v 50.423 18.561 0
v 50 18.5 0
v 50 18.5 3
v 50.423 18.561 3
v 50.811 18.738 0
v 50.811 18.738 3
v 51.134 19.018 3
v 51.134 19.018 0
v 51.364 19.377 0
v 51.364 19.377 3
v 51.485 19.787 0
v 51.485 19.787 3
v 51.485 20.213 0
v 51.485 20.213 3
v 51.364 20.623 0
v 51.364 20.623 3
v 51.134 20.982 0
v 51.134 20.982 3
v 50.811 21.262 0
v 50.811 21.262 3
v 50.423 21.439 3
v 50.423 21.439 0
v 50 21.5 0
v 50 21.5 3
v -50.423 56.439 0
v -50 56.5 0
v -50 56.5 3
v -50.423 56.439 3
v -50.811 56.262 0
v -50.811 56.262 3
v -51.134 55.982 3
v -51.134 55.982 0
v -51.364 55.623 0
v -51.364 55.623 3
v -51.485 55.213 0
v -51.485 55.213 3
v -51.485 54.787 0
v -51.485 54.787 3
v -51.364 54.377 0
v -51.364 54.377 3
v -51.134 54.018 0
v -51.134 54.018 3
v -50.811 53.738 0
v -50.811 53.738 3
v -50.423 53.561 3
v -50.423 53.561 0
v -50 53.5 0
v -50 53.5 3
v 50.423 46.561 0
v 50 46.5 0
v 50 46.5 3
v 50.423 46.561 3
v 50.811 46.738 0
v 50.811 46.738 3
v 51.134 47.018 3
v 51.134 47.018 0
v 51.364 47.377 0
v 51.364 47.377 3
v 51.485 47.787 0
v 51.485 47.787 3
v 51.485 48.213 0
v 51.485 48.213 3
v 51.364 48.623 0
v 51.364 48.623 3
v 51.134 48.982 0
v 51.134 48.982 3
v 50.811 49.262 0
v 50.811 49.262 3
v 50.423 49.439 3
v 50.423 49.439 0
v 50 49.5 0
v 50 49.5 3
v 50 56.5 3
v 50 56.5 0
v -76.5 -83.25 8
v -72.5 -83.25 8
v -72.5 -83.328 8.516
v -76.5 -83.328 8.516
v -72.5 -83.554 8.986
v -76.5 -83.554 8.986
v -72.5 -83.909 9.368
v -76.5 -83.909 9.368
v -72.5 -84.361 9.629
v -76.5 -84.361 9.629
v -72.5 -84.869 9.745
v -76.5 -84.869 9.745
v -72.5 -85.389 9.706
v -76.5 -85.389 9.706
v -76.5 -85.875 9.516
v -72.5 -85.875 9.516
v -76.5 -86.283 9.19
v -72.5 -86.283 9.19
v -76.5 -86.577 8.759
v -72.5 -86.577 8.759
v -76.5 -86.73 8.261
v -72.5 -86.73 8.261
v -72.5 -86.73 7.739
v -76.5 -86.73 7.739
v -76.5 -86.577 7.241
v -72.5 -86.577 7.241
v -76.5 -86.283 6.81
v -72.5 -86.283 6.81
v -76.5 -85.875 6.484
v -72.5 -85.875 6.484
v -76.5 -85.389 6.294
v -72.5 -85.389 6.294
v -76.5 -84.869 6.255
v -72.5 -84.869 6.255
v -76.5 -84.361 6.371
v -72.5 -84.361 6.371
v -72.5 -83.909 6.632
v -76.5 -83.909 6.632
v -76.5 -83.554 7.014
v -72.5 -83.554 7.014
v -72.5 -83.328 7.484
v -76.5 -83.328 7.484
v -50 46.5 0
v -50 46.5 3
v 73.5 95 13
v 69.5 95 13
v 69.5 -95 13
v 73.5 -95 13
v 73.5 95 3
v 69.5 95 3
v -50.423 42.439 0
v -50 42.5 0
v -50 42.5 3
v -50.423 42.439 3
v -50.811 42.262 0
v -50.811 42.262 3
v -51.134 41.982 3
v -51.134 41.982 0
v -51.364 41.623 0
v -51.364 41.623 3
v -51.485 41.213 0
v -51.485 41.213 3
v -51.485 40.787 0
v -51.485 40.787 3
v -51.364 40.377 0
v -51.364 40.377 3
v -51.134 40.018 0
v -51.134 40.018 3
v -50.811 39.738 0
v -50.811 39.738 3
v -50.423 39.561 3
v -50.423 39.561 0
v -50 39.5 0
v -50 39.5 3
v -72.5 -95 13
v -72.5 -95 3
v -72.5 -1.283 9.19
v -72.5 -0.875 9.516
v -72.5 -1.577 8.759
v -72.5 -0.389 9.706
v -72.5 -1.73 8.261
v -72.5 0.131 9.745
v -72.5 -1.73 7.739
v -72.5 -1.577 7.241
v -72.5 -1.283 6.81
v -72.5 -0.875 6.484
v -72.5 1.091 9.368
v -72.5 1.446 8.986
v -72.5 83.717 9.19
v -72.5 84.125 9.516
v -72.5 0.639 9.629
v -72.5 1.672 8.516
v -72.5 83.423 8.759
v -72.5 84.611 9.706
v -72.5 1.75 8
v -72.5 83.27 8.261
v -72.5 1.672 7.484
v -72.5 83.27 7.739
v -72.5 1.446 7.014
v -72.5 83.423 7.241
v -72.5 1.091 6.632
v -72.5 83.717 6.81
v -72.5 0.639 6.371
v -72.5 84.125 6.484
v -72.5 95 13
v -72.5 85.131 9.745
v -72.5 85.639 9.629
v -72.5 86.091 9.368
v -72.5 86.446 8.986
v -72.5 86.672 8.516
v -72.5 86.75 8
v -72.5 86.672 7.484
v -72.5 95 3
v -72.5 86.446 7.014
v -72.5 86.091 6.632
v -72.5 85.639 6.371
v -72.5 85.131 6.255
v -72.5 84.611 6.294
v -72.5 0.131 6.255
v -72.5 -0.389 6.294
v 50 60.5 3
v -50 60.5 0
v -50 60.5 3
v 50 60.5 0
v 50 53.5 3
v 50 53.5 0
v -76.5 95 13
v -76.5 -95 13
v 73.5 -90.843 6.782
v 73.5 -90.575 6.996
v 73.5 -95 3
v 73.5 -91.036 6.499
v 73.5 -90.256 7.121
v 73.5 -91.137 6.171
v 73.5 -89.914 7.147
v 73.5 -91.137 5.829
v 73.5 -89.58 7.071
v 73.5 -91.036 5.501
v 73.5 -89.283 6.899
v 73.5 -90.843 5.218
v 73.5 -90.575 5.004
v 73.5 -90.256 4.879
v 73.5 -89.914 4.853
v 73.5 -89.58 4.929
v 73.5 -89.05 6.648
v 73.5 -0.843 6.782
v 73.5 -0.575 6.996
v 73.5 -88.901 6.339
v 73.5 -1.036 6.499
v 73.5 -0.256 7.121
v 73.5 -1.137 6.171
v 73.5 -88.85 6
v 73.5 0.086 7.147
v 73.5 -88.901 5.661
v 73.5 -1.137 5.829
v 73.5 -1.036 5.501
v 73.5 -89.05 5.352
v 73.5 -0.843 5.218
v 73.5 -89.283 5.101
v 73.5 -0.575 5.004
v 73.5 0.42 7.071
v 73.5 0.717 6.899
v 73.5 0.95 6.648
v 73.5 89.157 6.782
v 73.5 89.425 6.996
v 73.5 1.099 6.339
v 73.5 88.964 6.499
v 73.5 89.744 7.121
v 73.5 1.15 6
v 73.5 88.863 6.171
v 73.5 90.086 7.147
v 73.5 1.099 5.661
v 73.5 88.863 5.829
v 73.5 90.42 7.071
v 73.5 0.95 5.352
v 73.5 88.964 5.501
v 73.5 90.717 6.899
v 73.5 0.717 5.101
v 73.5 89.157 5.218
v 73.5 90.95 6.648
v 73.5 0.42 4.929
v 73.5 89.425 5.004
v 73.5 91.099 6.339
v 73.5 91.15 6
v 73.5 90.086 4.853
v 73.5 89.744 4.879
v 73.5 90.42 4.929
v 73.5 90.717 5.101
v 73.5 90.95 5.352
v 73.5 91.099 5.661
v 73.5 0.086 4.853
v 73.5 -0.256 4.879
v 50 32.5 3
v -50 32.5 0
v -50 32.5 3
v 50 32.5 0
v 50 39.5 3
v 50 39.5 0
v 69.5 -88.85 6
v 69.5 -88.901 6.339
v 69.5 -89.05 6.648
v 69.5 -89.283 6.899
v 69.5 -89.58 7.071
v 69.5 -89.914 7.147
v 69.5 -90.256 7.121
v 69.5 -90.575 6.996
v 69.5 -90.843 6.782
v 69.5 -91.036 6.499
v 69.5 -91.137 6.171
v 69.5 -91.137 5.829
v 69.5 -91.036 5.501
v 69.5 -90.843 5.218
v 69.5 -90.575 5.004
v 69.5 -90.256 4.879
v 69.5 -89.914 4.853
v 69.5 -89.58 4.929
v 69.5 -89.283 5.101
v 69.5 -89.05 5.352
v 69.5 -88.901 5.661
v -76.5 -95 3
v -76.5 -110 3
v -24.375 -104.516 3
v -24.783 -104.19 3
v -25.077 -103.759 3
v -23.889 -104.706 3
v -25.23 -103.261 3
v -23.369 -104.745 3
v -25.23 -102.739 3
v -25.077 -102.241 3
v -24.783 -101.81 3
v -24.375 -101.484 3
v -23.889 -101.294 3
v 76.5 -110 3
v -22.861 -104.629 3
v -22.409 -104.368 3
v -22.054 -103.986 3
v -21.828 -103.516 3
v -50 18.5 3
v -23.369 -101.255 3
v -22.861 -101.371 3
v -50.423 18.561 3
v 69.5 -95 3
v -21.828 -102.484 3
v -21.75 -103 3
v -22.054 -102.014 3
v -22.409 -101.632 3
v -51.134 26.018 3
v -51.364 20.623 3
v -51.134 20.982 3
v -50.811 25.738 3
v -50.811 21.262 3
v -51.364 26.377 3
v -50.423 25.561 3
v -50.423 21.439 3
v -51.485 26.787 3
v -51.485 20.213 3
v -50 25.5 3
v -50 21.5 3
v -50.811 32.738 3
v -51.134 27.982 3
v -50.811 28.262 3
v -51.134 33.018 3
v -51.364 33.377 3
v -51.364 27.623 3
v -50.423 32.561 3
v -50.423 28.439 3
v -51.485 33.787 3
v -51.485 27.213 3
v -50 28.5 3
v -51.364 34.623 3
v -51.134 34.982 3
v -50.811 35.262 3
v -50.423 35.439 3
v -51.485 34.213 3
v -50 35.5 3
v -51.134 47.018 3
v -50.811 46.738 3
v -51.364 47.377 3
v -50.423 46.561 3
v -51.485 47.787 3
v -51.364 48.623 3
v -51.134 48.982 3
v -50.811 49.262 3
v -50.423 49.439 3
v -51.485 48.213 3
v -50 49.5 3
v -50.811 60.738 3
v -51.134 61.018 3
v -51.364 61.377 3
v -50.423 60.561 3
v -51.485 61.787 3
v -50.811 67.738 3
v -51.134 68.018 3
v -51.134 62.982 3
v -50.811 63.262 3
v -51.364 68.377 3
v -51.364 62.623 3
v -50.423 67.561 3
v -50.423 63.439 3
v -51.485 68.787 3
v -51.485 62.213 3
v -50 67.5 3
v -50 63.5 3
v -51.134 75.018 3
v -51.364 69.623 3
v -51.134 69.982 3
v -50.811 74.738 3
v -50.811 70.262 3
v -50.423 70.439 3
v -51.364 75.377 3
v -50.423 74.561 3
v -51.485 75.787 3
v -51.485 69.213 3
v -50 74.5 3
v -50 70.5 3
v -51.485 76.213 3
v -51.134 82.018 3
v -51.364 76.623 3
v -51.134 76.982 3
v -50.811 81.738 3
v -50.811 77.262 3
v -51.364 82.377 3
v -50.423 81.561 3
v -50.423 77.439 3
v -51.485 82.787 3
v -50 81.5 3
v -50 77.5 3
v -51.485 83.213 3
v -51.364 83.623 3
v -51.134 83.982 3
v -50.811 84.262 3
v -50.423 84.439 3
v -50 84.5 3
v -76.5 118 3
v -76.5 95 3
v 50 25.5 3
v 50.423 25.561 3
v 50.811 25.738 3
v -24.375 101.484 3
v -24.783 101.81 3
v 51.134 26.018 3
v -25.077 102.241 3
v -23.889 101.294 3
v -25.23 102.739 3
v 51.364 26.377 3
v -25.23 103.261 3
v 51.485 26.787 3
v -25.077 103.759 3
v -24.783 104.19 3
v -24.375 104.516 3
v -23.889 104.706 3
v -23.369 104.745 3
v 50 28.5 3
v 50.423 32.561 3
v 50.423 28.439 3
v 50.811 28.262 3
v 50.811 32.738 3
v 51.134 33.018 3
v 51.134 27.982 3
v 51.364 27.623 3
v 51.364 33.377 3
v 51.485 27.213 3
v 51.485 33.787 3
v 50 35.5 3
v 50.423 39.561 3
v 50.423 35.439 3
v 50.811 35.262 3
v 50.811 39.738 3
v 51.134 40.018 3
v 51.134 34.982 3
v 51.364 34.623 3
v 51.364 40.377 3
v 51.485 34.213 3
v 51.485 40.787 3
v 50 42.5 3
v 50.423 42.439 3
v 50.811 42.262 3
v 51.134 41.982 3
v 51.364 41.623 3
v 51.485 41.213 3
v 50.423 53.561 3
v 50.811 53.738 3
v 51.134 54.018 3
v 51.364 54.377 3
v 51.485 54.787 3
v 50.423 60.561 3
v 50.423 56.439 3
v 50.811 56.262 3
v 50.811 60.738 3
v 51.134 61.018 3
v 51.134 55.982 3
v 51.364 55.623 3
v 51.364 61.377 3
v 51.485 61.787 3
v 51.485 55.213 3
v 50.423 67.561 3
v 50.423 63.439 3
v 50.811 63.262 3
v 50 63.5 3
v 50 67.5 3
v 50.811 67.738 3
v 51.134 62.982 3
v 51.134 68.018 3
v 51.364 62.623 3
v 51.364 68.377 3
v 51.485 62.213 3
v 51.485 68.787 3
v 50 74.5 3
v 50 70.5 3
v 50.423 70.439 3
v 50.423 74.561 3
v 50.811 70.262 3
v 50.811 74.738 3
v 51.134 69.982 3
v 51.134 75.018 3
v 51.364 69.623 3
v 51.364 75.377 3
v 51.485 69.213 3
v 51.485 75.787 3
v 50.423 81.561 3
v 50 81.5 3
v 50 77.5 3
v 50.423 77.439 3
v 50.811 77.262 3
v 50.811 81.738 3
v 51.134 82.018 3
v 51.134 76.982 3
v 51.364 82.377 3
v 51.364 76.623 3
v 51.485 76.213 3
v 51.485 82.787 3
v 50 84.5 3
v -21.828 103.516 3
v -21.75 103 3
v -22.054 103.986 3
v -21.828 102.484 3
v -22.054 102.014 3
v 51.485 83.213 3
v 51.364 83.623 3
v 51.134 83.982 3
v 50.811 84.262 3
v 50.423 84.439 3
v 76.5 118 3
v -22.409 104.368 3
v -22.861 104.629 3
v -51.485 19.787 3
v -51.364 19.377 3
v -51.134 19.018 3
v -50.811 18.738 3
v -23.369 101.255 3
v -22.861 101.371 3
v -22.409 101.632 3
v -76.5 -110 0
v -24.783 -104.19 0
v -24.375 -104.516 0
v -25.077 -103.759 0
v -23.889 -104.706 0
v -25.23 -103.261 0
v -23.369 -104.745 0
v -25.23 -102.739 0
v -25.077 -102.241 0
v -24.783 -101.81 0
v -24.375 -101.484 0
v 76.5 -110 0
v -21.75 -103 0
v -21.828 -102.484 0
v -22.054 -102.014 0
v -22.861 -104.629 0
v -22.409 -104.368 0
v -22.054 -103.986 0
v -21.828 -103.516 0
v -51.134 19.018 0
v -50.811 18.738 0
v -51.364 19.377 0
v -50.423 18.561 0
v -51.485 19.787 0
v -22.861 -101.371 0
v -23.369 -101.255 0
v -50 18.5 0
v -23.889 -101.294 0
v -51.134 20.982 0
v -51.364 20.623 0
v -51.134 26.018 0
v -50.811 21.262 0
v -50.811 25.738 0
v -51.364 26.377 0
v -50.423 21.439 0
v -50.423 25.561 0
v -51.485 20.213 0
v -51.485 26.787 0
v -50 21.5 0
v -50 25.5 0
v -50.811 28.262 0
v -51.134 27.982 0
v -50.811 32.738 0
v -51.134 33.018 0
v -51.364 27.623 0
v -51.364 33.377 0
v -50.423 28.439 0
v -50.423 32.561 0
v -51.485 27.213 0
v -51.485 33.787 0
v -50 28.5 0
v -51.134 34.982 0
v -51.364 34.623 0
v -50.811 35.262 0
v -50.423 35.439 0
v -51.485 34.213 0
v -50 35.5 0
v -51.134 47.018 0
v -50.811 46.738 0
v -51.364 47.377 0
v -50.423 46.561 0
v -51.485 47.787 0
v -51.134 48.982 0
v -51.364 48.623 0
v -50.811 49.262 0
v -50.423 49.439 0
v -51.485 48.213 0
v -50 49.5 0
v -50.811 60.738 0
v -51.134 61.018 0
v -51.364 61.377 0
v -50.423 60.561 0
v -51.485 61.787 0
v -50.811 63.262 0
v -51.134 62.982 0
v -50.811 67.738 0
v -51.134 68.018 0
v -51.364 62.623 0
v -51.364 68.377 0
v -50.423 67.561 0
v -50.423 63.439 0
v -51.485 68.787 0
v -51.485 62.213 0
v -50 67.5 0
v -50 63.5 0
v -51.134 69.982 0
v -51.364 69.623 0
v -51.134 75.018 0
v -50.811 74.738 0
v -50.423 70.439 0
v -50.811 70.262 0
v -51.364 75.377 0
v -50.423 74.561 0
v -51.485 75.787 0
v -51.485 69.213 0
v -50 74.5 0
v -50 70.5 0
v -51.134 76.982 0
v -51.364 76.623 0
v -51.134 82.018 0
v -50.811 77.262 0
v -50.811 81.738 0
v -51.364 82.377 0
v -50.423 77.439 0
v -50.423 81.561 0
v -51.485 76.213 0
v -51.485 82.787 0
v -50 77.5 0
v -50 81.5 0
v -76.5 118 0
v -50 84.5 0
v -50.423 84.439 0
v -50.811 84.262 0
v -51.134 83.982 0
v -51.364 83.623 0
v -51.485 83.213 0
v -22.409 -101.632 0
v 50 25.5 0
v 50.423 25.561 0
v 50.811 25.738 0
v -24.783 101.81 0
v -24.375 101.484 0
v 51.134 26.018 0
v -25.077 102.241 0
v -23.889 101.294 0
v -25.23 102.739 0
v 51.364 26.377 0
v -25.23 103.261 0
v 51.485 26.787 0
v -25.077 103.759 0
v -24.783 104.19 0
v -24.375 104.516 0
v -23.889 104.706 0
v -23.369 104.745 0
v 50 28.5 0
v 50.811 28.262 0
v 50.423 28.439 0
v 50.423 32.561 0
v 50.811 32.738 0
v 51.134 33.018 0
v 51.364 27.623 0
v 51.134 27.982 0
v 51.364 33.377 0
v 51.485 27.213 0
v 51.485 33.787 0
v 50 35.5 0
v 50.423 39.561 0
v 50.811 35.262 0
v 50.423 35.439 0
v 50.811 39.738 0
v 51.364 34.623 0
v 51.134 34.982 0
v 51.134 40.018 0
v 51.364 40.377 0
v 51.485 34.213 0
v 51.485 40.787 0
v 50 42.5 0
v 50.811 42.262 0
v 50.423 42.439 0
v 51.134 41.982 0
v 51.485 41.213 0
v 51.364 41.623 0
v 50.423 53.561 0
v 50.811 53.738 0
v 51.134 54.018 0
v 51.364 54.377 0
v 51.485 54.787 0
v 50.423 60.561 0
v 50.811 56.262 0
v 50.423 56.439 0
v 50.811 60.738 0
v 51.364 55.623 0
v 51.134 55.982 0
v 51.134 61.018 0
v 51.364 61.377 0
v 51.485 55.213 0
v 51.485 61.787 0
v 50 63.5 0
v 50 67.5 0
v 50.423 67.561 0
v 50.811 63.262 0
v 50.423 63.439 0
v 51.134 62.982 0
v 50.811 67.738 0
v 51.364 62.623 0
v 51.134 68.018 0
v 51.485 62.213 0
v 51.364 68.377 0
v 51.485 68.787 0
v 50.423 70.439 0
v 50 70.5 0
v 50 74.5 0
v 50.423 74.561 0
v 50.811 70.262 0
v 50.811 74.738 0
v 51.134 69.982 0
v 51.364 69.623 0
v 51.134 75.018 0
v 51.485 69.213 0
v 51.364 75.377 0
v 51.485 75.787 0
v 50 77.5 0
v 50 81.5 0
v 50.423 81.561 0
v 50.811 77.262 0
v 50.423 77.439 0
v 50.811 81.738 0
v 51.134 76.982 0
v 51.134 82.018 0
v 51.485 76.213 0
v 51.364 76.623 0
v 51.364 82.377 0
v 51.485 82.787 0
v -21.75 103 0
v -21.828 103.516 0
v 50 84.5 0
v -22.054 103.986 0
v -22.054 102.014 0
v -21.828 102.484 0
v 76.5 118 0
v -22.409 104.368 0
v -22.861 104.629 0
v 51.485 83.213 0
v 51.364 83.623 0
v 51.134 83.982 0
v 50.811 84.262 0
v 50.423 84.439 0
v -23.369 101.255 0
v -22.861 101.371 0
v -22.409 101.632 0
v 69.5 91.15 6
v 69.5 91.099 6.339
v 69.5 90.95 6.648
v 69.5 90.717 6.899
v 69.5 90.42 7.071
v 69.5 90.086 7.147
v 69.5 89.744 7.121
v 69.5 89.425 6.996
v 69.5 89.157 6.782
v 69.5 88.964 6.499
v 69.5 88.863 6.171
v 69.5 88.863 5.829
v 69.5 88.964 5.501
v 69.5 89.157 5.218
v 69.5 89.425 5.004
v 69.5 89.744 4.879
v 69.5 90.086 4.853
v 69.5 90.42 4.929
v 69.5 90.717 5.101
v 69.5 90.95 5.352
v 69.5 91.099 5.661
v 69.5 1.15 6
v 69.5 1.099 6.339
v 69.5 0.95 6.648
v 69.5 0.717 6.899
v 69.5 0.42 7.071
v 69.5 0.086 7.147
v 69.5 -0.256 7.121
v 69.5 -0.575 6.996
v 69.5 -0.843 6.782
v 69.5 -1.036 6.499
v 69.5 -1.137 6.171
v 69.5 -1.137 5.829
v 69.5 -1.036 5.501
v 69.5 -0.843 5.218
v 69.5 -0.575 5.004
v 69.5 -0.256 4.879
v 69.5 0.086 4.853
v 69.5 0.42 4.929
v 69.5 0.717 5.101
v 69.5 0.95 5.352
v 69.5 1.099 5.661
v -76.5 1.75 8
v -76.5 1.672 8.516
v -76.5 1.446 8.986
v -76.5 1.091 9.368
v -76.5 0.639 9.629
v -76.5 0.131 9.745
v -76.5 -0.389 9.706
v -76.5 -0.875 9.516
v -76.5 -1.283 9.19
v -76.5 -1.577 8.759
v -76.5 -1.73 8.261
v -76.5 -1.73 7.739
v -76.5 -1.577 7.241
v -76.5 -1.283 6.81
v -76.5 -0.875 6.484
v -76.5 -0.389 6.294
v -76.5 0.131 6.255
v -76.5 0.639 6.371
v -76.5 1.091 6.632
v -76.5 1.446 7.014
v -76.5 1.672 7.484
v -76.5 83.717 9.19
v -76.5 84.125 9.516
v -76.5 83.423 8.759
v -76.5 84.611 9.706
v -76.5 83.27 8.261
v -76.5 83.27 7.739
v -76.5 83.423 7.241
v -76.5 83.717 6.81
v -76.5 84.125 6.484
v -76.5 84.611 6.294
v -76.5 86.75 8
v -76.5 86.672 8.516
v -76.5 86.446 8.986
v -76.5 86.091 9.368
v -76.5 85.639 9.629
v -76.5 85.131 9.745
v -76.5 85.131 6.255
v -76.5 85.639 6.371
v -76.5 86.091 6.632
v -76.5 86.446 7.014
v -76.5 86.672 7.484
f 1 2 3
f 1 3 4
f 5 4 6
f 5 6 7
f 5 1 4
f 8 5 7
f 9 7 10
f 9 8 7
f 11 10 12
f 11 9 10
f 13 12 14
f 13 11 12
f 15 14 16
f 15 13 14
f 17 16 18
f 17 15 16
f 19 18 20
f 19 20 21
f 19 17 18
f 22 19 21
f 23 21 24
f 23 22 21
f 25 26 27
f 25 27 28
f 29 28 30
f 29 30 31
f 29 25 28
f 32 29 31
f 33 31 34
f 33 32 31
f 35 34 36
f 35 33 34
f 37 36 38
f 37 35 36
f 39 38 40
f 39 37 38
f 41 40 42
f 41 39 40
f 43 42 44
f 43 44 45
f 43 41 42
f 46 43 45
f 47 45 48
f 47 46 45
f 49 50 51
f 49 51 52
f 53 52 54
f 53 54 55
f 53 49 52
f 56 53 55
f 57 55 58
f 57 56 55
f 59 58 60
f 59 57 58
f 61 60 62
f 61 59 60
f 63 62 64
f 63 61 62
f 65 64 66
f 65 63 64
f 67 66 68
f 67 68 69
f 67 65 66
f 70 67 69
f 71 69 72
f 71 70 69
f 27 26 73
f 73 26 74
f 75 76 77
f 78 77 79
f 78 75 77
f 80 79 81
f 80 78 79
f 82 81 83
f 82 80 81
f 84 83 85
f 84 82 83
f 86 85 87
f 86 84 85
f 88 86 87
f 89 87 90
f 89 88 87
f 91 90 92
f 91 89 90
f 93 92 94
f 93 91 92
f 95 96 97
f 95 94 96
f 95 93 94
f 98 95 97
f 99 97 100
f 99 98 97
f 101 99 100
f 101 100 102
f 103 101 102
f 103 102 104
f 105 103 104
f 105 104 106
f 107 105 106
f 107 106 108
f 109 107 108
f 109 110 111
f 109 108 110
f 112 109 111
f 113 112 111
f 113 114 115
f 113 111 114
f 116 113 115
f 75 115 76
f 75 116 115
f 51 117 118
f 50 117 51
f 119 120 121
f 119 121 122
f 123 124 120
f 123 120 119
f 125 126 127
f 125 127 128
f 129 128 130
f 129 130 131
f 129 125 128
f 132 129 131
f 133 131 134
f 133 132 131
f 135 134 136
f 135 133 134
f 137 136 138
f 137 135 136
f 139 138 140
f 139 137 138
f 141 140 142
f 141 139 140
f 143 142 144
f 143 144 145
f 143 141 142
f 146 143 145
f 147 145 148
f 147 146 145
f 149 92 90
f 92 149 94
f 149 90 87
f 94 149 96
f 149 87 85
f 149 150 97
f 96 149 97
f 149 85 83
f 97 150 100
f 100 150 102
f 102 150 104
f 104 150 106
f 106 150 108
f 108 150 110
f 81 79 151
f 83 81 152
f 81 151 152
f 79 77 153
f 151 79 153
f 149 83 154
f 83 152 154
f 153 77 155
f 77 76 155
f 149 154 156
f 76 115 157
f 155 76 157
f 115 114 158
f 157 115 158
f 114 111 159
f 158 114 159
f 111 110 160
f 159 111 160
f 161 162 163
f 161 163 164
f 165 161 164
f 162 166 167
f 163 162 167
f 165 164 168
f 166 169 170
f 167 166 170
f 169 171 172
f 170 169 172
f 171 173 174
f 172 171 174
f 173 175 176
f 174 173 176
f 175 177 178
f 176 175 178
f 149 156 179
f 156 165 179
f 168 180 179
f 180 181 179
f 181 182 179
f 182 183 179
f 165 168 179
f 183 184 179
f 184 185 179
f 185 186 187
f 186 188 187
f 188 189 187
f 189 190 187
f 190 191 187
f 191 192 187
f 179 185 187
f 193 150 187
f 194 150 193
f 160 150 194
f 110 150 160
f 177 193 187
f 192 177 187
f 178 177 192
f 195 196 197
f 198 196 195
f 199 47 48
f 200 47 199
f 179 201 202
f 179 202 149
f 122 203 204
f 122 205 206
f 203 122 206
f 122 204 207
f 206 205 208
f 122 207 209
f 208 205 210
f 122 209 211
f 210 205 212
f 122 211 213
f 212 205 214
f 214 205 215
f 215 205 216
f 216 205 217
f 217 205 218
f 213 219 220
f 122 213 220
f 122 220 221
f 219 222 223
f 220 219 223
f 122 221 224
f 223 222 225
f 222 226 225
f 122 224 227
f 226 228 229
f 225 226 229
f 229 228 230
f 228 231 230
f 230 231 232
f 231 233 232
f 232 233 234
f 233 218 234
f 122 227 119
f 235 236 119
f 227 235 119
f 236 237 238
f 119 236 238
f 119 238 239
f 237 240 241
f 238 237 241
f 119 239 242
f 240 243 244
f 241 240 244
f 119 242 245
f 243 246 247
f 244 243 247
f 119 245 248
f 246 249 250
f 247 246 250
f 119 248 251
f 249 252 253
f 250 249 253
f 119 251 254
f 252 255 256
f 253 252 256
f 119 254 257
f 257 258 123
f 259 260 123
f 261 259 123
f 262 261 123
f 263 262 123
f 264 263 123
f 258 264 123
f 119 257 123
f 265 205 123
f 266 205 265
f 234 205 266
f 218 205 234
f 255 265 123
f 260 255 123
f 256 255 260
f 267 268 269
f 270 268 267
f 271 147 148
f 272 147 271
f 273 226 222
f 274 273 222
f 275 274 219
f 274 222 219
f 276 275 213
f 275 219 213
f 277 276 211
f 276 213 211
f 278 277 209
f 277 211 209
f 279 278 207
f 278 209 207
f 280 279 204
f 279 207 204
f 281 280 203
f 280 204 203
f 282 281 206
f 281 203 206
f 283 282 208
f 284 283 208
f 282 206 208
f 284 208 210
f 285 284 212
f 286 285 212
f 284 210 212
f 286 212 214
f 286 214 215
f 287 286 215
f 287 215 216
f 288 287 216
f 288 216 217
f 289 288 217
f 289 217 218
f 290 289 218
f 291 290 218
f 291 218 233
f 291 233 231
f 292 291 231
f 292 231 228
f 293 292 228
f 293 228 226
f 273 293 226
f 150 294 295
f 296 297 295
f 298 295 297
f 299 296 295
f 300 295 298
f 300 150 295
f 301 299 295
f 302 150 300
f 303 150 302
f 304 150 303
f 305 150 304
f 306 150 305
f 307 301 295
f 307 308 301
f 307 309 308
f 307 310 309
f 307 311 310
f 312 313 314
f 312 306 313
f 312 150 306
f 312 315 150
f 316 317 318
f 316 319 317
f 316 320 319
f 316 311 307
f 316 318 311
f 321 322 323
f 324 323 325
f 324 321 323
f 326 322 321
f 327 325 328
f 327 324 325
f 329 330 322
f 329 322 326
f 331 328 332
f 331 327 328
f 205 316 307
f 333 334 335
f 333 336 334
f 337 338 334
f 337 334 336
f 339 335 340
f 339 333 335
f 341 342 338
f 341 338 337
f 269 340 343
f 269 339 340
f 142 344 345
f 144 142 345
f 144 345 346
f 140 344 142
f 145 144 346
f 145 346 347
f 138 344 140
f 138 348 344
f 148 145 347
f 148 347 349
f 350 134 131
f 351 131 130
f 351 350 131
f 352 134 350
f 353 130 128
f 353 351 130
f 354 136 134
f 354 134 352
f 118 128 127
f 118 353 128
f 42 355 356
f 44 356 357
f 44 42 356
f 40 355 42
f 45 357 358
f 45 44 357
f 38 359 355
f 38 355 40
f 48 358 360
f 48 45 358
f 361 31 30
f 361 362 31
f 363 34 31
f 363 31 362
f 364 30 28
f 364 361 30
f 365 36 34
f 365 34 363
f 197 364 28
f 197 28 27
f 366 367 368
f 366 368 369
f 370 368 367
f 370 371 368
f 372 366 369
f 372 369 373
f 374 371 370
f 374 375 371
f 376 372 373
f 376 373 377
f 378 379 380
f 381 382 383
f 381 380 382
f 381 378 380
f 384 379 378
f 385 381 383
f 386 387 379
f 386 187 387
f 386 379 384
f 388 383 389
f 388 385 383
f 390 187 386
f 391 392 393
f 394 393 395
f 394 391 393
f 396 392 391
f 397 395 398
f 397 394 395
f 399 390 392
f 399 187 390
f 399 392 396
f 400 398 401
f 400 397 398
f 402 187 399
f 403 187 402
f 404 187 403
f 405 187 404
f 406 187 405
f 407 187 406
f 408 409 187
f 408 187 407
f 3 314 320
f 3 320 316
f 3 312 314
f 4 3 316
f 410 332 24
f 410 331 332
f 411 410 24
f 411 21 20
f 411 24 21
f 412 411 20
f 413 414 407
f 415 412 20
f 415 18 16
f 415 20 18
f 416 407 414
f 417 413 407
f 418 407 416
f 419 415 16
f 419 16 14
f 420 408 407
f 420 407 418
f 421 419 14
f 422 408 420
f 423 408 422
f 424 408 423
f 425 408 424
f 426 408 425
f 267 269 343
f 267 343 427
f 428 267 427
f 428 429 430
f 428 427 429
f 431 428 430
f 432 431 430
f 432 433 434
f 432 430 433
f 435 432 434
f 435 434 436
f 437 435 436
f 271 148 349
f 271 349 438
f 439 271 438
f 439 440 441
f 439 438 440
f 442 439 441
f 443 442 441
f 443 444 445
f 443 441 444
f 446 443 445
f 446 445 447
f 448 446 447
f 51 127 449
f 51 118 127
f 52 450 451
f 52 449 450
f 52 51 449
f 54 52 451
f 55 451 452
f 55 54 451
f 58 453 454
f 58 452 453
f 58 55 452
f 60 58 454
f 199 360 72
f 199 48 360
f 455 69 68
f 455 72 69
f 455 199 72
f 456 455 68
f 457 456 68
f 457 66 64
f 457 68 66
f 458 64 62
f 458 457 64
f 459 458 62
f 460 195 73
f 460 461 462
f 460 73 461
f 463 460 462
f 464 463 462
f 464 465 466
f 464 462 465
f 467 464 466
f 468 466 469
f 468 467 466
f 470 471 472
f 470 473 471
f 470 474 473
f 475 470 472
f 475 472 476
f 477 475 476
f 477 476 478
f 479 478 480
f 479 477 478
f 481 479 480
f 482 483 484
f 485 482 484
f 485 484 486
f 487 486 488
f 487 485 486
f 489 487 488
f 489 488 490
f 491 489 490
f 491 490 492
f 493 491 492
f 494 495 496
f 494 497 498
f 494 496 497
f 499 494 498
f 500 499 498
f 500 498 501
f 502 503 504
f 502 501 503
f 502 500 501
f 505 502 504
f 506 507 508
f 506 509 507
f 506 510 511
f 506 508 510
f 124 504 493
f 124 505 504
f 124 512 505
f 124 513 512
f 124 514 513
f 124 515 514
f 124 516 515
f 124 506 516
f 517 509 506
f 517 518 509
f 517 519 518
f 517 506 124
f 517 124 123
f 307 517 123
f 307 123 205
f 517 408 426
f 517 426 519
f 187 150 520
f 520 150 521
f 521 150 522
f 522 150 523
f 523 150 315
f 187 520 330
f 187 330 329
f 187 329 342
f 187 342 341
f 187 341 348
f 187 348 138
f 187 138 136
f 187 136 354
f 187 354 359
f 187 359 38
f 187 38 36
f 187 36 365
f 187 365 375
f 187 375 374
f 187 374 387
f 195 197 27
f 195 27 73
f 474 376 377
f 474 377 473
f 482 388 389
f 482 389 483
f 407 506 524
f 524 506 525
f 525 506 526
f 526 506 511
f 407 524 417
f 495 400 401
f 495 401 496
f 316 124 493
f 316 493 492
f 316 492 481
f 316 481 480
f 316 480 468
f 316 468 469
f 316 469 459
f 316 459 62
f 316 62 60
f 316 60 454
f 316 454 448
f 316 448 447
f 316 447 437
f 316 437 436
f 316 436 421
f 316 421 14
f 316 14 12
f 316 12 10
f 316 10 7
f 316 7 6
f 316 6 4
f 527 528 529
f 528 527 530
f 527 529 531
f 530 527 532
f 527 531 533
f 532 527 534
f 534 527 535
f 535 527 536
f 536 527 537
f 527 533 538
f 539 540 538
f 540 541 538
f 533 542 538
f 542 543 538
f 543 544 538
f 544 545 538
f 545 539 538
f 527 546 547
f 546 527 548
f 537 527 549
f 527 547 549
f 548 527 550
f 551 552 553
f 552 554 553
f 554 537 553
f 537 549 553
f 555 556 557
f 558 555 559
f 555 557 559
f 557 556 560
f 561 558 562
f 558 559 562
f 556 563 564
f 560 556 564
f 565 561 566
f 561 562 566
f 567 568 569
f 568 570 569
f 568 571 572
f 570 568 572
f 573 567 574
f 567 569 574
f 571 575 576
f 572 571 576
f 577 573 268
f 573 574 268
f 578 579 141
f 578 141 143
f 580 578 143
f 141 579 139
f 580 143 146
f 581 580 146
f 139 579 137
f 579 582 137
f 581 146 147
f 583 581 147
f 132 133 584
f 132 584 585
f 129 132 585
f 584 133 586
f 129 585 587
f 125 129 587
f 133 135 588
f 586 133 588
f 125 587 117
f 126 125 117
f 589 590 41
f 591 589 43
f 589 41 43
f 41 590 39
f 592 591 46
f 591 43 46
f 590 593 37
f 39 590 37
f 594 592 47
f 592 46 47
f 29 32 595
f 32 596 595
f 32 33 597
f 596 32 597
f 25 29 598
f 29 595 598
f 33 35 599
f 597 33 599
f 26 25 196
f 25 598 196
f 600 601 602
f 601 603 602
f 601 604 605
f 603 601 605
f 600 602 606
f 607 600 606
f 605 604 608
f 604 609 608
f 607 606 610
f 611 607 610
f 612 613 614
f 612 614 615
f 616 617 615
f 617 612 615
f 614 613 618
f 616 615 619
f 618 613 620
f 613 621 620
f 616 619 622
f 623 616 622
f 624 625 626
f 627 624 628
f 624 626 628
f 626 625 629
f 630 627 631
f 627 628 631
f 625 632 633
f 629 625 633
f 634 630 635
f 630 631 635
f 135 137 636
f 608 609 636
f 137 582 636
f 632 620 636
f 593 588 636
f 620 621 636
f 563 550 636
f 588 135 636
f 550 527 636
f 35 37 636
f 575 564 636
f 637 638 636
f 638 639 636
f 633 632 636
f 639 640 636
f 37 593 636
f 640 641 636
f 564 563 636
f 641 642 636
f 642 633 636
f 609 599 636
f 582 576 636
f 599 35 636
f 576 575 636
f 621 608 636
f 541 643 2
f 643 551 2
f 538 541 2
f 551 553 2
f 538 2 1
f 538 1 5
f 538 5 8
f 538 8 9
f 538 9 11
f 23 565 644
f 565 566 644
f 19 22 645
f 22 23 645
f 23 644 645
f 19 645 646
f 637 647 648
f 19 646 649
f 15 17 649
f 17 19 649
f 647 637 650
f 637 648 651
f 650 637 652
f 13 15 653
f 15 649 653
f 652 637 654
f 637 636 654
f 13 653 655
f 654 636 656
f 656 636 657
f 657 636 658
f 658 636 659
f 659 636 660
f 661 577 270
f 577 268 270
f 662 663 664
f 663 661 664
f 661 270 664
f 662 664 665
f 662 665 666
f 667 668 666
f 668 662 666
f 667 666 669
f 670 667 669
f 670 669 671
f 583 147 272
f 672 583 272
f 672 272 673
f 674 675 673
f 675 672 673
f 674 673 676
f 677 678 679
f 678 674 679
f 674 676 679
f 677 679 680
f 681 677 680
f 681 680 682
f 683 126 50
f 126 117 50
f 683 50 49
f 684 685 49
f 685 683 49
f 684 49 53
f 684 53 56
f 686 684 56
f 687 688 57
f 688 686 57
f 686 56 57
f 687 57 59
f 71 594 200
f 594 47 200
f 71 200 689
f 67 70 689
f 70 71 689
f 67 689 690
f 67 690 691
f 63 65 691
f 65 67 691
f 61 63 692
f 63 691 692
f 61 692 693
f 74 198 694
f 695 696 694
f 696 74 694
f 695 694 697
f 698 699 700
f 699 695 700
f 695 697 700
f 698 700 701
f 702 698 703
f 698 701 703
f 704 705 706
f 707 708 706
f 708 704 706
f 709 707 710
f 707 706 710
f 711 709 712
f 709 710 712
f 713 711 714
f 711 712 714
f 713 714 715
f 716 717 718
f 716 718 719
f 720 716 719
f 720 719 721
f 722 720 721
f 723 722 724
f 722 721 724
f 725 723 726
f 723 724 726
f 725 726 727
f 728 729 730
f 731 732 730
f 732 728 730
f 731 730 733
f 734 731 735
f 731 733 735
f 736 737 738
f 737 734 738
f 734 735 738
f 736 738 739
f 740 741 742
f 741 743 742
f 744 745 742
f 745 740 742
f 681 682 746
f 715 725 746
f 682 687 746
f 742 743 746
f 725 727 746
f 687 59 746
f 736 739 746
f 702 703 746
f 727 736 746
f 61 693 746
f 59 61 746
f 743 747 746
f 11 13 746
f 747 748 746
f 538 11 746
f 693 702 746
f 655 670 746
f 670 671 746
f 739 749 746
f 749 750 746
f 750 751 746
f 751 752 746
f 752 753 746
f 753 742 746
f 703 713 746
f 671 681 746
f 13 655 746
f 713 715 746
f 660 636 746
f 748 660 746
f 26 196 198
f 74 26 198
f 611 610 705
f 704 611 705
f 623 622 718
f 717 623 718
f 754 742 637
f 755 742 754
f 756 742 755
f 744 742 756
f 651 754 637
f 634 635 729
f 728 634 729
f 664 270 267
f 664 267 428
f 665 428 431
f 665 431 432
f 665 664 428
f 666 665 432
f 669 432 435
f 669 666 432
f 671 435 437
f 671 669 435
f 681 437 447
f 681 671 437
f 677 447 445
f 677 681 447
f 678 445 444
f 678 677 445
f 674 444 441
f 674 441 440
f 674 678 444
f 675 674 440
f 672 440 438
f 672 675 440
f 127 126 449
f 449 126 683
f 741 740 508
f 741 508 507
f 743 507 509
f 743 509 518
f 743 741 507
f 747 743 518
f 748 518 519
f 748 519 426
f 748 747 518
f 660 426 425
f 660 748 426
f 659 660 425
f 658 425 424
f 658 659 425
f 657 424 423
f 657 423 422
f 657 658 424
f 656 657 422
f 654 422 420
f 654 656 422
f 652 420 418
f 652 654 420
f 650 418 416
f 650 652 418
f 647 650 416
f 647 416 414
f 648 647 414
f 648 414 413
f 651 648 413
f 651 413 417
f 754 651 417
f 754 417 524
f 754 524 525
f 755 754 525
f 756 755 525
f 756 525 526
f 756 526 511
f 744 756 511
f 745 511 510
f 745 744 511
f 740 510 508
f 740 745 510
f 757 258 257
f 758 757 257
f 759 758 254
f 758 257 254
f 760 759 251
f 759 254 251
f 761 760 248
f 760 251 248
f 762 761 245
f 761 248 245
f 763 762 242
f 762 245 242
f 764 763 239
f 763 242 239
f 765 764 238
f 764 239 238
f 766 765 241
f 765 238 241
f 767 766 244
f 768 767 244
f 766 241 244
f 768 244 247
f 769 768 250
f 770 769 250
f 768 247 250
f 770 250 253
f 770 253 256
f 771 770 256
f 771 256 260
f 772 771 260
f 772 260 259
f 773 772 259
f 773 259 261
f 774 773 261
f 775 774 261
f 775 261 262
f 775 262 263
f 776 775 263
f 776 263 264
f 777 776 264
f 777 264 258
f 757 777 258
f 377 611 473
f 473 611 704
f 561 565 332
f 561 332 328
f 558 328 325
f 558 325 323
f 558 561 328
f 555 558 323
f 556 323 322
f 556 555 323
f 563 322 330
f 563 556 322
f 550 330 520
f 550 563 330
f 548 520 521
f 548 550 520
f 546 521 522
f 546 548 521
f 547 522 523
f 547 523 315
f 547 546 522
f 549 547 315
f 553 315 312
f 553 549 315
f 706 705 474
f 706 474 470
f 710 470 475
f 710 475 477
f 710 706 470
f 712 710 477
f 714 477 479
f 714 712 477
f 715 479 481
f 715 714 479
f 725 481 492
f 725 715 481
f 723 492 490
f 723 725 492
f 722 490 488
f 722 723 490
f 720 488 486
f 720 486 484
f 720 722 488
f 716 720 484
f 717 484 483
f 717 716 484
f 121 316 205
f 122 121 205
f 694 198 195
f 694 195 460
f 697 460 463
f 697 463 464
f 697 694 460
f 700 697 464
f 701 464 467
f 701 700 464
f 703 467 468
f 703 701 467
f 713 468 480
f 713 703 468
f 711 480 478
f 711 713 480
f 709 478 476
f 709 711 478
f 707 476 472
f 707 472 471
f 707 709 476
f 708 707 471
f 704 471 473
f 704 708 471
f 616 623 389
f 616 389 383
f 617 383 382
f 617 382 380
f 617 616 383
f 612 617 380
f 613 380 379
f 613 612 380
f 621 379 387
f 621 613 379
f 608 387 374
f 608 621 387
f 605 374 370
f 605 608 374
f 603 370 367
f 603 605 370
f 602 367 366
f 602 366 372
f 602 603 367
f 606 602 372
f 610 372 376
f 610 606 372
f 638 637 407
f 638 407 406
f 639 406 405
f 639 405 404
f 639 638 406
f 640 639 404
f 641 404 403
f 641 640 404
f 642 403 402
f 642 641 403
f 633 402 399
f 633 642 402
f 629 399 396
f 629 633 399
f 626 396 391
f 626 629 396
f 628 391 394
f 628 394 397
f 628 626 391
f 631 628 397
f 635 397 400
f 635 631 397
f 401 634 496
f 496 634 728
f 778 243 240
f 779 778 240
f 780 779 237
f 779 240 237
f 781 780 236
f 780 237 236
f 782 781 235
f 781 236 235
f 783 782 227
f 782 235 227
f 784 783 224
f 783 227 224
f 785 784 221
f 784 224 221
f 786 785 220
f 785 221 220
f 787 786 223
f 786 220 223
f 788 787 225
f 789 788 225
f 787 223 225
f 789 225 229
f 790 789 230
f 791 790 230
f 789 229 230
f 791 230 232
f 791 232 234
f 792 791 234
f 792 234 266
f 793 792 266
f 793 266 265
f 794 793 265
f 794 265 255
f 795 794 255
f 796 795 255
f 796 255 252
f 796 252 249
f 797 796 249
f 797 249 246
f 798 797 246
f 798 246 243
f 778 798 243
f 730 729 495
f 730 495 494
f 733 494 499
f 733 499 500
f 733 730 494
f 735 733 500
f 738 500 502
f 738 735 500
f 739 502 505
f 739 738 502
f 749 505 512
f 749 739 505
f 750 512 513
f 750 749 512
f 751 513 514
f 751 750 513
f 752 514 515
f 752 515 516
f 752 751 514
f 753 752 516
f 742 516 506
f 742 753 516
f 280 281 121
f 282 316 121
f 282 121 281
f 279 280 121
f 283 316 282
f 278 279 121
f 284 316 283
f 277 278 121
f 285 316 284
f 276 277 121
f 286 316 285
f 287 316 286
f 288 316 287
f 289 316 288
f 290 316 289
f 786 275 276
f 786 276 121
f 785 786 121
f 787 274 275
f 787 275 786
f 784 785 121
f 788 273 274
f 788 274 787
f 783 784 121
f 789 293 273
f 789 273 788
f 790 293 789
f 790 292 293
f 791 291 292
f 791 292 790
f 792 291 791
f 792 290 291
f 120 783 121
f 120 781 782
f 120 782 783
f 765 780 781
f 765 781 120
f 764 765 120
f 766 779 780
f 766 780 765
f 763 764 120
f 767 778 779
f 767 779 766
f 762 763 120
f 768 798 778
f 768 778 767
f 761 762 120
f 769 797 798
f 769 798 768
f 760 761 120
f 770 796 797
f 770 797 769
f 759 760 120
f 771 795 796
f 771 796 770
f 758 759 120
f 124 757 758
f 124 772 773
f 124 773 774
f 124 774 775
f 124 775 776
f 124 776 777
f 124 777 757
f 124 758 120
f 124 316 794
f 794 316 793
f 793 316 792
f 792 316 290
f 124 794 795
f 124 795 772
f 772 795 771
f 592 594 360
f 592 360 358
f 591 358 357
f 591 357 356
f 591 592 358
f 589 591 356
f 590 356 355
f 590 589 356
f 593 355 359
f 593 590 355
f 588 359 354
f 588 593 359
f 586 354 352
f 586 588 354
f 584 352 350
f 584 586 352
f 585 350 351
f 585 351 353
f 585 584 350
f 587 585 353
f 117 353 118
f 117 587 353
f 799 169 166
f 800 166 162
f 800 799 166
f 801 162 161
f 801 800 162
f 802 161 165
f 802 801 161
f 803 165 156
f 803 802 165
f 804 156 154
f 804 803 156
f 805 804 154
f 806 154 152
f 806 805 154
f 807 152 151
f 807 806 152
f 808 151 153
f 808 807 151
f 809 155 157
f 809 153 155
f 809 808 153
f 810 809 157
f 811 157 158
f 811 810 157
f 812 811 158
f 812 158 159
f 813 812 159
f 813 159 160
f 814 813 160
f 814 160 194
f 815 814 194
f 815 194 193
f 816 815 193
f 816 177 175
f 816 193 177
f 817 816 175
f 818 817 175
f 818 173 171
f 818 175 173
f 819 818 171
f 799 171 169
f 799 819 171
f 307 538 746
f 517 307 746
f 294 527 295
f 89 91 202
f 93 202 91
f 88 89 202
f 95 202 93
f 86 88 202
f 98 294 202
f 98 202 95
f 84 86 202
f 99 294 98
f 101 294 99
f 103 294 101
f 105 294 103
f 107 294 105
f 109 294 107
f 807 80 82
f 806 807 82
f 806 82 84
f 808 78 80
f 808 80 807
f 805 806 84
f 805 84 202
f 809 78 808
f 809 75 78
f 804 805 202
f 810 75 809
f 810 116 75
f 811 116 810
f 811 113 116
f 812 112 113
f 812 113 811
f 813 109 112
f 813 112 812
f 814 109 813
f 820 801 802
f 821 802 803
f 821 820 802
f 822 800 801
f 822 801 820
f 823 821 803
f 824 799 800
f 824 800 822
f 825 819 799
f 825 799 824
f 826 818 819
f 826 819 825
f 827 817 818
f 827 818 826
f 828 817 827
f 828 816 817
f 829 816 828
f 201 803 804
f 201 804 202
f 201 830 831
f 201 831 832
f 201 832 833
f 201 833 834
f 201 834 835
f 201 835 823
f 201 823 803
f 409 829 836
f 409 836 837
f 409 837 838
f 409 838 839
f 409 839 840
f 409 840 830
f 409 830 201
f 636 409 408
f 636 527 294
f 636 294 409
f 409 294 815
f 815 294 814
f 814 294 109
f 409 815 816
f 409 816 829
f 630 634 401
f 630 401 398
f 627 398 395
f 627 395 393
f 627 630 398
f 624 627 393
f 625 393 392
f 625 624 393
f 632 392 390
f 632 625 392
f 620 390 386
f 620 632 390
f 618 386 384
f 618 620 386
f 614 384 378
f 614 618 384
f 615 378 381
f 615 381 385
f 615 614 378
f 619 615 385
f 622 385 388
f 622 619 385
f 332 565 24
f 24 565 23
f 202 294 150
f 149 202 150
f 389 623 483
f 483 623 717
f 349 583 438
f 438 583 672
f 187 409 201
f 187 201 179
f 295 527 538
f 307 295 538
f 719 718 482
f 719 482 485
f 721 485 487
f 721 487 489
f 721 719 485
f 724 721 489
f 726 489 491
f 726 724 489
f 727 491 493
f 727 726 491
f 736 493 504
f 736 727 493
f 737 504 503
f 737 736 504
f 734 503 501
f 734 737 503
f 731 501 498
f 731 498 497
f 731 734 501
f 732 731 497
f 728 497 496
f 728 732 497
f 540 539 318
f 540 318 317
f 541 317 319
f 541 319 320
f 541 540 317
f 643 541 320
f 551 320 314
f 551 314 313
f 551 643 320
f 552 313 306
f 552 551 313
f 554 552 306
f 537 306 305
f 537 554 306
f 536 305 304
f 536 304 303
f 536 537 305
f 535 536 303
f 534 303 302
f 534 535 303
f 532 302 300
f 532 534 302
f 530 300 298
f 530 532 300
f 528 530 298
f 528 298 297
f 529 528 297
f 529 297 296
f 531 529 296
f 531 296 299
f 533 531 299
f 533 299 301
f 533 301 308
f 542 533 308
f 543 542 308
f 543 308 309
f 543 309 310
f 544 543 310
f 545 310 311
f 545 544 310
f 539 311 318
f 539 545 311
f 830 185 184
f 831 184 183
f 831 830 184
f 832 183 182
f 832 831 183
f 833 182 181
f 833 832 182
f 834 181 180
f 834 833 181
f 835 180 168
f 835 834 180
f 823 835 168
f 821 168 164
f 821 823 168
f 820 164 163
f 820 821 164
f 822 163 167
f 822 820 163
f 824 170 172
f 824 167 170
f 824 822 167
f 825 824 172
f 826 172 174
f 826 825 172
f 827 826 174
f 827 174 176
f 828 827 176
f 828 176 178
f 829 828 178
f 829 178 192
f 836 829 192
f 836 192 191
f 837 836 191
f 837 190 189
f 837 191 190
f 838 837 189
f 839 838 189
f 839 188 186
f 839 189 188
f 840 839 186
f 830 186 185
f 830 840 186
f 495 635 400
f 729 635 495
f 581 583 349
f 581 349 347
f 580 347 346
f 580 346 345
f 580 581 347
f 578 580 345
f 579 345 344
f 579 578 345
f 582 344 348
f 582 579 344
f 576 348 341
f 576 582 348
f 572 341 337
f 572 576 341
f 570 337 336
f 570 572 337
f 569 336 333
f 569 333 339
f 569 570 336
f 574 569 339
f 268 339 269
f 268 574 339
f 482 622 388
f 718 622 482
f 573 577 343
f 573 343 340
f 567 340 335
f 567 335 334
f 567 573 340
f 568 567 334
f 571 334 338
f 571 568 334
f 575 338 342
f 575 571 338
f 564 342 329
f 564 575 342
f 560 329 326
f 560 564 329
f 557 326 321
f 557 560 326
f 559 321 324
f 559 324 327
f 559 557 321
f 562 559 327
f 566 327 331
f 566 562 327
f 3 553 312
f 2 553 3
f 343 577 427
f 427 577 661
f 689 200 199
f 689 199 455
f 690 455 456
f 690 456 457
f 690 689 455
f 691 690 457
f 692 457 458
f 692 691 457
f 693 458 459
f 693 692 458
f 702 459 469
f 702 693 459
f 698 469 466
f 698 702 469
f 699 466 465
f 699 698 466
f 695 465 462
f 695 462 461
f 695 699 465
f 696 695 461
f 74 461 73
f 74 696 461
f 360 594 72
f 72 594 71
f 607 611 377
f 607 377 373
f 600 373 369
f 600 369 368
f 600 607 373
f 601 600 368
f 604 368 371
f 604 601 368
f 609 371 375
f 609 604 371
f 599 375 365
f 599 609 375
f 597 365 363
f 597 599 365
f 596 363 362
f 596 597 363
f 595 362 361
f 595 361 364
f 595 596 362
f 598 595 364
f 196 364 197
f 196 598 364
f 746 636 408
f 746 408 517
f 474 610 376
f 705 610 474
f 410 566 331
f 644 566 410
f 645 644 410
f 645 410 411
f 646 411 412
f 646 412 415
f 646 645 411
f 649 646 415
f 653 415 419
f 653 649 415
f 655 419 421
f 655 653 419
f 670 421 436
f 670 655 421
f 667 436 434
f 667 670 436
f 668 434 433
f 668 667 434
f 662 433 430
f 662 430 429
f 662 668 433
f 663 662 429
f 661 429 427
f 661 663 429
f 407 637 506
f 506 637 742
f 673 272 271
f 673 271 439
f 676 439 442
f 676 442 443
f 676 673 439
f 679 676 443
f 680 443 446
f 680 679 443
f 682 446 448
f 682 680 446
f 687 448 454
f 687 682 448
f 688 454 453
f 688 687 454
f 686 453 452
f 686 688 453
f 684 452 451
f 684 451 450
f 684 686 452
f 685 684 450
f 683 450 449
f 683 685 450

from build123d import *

# Parameters (mm, degrees)
SKETCH_W        = 153
SKETCH_H        = 228
SKETCH_R        = 1.75
PAD_DEPTH       = 3
SKETCH001_W     = 4
SKETCH001_H     = 190
PAD001_DEPTH    = 10
SKETCH002_R     = 1.75
POCKET_DEPTH    = 5
SKETCH003_R     = 1.15
POCKET001_DEPTH = 5


with BuildPart() as part:
    # Sketch → Pad (new body)
    with BuildSketch(Plane.XY):
        with Locations((0, 4)):
            Rectangle(SKETCH_W, SKETCH_H)
        with Locations((-23.5, 103)):
            Circle(SKETCH_R, mode=Mode.SUBTRACT)
        with Locations((-23.5, -103)):
            Circle(SKETCH_R, mode=Mode.SUBTRACT)
        with BuildLine():
            ThreePointArc((-50, 84.5), (-51.5, 83), (-50, 81.5))
            Line((-50, 81.5), (50, 81.5))
            ThreePointArc((50, 81.5), (51.5, 83), (50, 84.5))
            Line((-50, 84.5), (50, 84.5))
        make_face(mode=Mode.SUBTRACT)
        with BuildLine():
            ThreePointArc((-50, 77.5), (-51.5, 76), (-50, 74.5))
            Line((-50, 74.5), (50, 74.5))
            ThreePointArc((50, 74.5), (51.5, 76), (50, 77.5))
            Line((-50, 77.5), (50, 77.5))
        make_face(mode=Mode.SUBTRACT)
        with BuildLine():
            ThreePointArc((-50, 70.5), (-51.5, 69), (-50, 67.5))
            Line((-50, 67.5), (50, 67.5))
            ThreePointArc((50, 67.5), (51.5, 69), (50, 70.5))
            Line((-50, 70.5), (50, 70.5))
        make_face(mode=Mode.SUBTRACT)
        with BuildLine():
            ThreePointArc((-50, 63.5), (-51.5, 62), (-50, 60.5))
            Line((-50, 60.5), (50, 60.5))
            ThreePointArc((50, 60.5), (51.5, 62), (50, 63.5))
            Line((-50, 63.5), (50, 63.5))
        make_face(mode=Mode.SUBTRACT)
        with BuildLine():
            ThreePointArc((-50, 56.5), (-51.5, 55), (-50, 53.5))
            Line((-50, 53.5), (50, 53.5))
            ThreePointArc((50, 53.5), (51.5, 55), (50, 56.5))
            Line((-50, 56.5), (50, 56.5))
        make_face(mode=Mode.SUBTRACT)
        with BuildLine():
            ThreePointArc((-50, 49.5), (-51.5, 48), (-50, 46.5))
            Line((-50, 46.5), (50, 46.5))
            ThreePointArc((50, 46.5), (51.5, 48), (50, 49.5))
            Line((-50, 49.5), (50, 49.5))
        make_face(mode=Mode.SUBTRACT)
        with BuildLine():
            ThreePointArc((-50, 42.5), (-51.5, 41), (-50, 39.5))
            Line((-50, 39.5), (50, 39.5))
            ThreePointArc((50, 39.5), (51.5, 41), (50, 42.5))
            Line((-50, 42.5), (50, 42.5))
        make_face(mode=Mode.SUBTRACT)
        with BuildLine():
            ThreePointArc((-50, 35.5), (-51.5, 34), (-50, 32.5))
            Line((-50, 32.5), (50, 32.5))
            ThreePointArc((50, 32.5), (51.5, 34), (50, 35.5))
            Line((-50, 35.5), (50, 35.5))
        make_face(mode=Mode.SUBTRACT)
        with BuildLine():
            ThreePointArc((-50, 28.5), (-51.5, 27), (-50, 25.5))
            Line((-50, 25.5), (50, 25.5))
            ThreePointArc((50, 25.5), (51.5, 27), (50, 28.5))
            Line((-50, 28.5), (50, 28.5))
        make_face(mode=Mode.SUBTRACT)
        with BuildLine():
            ThreePointArc((-50, 21.5), (-51.5, 20), (-50, 18.5))
            Line((-50, 18.5), (50, 18.5))
            ThreePointArc((50, 18.5), (51.5, 20), (50, 21.5))
            Line((-50, 21.5), (50, 21.5))
        make_face(mode=Mode.SUBTRACT)
    extrude(amount=PAD_DEPTH)

    # Sketch001 → Pad001 (join)
    with BuildSketch(Plane.XY.offset(3)):
        with Locations((-74.5, 0)):
            Rectangle(SKETCH001_W, SKETCH001_H)
        with Locations((71.5, 0)):
            Rectangle(SKETCH001_W, SKETCH001_H)
    extrude(amount=PAD001_DEPTH)

    # Sketch002 → Pocket (cut)
    with BuildSketch(Plane.YZ.offset(-76.5)):
        with Locations((-85, 8)):
            Circle(SKETCH002_R)
        with Locations((0, 8)):
            Circle(SKETCH002_R)
        with Locations((85, 8)):
            Circle(SKETCH002_R)
    extrude(amount=POCKET_DEPTH, mode=Mode.SUBTRACT)

    # Sketch003 → Pocket001 (cut)
    with BuildSketch(Plane.YZ.offset(73.5)):
        with Locations((-90, 6)):
            Circle(SKETCH003_R)
        with Locations((0, 6)):
            Circle(SKETCH003_R)
        with Locations((90, 6)):
            Circle(SKETCH003_R)
    extrude(amount=-POCKET001_DEPTH, mode=Mode.SUBTRACT)


solid = part.part
